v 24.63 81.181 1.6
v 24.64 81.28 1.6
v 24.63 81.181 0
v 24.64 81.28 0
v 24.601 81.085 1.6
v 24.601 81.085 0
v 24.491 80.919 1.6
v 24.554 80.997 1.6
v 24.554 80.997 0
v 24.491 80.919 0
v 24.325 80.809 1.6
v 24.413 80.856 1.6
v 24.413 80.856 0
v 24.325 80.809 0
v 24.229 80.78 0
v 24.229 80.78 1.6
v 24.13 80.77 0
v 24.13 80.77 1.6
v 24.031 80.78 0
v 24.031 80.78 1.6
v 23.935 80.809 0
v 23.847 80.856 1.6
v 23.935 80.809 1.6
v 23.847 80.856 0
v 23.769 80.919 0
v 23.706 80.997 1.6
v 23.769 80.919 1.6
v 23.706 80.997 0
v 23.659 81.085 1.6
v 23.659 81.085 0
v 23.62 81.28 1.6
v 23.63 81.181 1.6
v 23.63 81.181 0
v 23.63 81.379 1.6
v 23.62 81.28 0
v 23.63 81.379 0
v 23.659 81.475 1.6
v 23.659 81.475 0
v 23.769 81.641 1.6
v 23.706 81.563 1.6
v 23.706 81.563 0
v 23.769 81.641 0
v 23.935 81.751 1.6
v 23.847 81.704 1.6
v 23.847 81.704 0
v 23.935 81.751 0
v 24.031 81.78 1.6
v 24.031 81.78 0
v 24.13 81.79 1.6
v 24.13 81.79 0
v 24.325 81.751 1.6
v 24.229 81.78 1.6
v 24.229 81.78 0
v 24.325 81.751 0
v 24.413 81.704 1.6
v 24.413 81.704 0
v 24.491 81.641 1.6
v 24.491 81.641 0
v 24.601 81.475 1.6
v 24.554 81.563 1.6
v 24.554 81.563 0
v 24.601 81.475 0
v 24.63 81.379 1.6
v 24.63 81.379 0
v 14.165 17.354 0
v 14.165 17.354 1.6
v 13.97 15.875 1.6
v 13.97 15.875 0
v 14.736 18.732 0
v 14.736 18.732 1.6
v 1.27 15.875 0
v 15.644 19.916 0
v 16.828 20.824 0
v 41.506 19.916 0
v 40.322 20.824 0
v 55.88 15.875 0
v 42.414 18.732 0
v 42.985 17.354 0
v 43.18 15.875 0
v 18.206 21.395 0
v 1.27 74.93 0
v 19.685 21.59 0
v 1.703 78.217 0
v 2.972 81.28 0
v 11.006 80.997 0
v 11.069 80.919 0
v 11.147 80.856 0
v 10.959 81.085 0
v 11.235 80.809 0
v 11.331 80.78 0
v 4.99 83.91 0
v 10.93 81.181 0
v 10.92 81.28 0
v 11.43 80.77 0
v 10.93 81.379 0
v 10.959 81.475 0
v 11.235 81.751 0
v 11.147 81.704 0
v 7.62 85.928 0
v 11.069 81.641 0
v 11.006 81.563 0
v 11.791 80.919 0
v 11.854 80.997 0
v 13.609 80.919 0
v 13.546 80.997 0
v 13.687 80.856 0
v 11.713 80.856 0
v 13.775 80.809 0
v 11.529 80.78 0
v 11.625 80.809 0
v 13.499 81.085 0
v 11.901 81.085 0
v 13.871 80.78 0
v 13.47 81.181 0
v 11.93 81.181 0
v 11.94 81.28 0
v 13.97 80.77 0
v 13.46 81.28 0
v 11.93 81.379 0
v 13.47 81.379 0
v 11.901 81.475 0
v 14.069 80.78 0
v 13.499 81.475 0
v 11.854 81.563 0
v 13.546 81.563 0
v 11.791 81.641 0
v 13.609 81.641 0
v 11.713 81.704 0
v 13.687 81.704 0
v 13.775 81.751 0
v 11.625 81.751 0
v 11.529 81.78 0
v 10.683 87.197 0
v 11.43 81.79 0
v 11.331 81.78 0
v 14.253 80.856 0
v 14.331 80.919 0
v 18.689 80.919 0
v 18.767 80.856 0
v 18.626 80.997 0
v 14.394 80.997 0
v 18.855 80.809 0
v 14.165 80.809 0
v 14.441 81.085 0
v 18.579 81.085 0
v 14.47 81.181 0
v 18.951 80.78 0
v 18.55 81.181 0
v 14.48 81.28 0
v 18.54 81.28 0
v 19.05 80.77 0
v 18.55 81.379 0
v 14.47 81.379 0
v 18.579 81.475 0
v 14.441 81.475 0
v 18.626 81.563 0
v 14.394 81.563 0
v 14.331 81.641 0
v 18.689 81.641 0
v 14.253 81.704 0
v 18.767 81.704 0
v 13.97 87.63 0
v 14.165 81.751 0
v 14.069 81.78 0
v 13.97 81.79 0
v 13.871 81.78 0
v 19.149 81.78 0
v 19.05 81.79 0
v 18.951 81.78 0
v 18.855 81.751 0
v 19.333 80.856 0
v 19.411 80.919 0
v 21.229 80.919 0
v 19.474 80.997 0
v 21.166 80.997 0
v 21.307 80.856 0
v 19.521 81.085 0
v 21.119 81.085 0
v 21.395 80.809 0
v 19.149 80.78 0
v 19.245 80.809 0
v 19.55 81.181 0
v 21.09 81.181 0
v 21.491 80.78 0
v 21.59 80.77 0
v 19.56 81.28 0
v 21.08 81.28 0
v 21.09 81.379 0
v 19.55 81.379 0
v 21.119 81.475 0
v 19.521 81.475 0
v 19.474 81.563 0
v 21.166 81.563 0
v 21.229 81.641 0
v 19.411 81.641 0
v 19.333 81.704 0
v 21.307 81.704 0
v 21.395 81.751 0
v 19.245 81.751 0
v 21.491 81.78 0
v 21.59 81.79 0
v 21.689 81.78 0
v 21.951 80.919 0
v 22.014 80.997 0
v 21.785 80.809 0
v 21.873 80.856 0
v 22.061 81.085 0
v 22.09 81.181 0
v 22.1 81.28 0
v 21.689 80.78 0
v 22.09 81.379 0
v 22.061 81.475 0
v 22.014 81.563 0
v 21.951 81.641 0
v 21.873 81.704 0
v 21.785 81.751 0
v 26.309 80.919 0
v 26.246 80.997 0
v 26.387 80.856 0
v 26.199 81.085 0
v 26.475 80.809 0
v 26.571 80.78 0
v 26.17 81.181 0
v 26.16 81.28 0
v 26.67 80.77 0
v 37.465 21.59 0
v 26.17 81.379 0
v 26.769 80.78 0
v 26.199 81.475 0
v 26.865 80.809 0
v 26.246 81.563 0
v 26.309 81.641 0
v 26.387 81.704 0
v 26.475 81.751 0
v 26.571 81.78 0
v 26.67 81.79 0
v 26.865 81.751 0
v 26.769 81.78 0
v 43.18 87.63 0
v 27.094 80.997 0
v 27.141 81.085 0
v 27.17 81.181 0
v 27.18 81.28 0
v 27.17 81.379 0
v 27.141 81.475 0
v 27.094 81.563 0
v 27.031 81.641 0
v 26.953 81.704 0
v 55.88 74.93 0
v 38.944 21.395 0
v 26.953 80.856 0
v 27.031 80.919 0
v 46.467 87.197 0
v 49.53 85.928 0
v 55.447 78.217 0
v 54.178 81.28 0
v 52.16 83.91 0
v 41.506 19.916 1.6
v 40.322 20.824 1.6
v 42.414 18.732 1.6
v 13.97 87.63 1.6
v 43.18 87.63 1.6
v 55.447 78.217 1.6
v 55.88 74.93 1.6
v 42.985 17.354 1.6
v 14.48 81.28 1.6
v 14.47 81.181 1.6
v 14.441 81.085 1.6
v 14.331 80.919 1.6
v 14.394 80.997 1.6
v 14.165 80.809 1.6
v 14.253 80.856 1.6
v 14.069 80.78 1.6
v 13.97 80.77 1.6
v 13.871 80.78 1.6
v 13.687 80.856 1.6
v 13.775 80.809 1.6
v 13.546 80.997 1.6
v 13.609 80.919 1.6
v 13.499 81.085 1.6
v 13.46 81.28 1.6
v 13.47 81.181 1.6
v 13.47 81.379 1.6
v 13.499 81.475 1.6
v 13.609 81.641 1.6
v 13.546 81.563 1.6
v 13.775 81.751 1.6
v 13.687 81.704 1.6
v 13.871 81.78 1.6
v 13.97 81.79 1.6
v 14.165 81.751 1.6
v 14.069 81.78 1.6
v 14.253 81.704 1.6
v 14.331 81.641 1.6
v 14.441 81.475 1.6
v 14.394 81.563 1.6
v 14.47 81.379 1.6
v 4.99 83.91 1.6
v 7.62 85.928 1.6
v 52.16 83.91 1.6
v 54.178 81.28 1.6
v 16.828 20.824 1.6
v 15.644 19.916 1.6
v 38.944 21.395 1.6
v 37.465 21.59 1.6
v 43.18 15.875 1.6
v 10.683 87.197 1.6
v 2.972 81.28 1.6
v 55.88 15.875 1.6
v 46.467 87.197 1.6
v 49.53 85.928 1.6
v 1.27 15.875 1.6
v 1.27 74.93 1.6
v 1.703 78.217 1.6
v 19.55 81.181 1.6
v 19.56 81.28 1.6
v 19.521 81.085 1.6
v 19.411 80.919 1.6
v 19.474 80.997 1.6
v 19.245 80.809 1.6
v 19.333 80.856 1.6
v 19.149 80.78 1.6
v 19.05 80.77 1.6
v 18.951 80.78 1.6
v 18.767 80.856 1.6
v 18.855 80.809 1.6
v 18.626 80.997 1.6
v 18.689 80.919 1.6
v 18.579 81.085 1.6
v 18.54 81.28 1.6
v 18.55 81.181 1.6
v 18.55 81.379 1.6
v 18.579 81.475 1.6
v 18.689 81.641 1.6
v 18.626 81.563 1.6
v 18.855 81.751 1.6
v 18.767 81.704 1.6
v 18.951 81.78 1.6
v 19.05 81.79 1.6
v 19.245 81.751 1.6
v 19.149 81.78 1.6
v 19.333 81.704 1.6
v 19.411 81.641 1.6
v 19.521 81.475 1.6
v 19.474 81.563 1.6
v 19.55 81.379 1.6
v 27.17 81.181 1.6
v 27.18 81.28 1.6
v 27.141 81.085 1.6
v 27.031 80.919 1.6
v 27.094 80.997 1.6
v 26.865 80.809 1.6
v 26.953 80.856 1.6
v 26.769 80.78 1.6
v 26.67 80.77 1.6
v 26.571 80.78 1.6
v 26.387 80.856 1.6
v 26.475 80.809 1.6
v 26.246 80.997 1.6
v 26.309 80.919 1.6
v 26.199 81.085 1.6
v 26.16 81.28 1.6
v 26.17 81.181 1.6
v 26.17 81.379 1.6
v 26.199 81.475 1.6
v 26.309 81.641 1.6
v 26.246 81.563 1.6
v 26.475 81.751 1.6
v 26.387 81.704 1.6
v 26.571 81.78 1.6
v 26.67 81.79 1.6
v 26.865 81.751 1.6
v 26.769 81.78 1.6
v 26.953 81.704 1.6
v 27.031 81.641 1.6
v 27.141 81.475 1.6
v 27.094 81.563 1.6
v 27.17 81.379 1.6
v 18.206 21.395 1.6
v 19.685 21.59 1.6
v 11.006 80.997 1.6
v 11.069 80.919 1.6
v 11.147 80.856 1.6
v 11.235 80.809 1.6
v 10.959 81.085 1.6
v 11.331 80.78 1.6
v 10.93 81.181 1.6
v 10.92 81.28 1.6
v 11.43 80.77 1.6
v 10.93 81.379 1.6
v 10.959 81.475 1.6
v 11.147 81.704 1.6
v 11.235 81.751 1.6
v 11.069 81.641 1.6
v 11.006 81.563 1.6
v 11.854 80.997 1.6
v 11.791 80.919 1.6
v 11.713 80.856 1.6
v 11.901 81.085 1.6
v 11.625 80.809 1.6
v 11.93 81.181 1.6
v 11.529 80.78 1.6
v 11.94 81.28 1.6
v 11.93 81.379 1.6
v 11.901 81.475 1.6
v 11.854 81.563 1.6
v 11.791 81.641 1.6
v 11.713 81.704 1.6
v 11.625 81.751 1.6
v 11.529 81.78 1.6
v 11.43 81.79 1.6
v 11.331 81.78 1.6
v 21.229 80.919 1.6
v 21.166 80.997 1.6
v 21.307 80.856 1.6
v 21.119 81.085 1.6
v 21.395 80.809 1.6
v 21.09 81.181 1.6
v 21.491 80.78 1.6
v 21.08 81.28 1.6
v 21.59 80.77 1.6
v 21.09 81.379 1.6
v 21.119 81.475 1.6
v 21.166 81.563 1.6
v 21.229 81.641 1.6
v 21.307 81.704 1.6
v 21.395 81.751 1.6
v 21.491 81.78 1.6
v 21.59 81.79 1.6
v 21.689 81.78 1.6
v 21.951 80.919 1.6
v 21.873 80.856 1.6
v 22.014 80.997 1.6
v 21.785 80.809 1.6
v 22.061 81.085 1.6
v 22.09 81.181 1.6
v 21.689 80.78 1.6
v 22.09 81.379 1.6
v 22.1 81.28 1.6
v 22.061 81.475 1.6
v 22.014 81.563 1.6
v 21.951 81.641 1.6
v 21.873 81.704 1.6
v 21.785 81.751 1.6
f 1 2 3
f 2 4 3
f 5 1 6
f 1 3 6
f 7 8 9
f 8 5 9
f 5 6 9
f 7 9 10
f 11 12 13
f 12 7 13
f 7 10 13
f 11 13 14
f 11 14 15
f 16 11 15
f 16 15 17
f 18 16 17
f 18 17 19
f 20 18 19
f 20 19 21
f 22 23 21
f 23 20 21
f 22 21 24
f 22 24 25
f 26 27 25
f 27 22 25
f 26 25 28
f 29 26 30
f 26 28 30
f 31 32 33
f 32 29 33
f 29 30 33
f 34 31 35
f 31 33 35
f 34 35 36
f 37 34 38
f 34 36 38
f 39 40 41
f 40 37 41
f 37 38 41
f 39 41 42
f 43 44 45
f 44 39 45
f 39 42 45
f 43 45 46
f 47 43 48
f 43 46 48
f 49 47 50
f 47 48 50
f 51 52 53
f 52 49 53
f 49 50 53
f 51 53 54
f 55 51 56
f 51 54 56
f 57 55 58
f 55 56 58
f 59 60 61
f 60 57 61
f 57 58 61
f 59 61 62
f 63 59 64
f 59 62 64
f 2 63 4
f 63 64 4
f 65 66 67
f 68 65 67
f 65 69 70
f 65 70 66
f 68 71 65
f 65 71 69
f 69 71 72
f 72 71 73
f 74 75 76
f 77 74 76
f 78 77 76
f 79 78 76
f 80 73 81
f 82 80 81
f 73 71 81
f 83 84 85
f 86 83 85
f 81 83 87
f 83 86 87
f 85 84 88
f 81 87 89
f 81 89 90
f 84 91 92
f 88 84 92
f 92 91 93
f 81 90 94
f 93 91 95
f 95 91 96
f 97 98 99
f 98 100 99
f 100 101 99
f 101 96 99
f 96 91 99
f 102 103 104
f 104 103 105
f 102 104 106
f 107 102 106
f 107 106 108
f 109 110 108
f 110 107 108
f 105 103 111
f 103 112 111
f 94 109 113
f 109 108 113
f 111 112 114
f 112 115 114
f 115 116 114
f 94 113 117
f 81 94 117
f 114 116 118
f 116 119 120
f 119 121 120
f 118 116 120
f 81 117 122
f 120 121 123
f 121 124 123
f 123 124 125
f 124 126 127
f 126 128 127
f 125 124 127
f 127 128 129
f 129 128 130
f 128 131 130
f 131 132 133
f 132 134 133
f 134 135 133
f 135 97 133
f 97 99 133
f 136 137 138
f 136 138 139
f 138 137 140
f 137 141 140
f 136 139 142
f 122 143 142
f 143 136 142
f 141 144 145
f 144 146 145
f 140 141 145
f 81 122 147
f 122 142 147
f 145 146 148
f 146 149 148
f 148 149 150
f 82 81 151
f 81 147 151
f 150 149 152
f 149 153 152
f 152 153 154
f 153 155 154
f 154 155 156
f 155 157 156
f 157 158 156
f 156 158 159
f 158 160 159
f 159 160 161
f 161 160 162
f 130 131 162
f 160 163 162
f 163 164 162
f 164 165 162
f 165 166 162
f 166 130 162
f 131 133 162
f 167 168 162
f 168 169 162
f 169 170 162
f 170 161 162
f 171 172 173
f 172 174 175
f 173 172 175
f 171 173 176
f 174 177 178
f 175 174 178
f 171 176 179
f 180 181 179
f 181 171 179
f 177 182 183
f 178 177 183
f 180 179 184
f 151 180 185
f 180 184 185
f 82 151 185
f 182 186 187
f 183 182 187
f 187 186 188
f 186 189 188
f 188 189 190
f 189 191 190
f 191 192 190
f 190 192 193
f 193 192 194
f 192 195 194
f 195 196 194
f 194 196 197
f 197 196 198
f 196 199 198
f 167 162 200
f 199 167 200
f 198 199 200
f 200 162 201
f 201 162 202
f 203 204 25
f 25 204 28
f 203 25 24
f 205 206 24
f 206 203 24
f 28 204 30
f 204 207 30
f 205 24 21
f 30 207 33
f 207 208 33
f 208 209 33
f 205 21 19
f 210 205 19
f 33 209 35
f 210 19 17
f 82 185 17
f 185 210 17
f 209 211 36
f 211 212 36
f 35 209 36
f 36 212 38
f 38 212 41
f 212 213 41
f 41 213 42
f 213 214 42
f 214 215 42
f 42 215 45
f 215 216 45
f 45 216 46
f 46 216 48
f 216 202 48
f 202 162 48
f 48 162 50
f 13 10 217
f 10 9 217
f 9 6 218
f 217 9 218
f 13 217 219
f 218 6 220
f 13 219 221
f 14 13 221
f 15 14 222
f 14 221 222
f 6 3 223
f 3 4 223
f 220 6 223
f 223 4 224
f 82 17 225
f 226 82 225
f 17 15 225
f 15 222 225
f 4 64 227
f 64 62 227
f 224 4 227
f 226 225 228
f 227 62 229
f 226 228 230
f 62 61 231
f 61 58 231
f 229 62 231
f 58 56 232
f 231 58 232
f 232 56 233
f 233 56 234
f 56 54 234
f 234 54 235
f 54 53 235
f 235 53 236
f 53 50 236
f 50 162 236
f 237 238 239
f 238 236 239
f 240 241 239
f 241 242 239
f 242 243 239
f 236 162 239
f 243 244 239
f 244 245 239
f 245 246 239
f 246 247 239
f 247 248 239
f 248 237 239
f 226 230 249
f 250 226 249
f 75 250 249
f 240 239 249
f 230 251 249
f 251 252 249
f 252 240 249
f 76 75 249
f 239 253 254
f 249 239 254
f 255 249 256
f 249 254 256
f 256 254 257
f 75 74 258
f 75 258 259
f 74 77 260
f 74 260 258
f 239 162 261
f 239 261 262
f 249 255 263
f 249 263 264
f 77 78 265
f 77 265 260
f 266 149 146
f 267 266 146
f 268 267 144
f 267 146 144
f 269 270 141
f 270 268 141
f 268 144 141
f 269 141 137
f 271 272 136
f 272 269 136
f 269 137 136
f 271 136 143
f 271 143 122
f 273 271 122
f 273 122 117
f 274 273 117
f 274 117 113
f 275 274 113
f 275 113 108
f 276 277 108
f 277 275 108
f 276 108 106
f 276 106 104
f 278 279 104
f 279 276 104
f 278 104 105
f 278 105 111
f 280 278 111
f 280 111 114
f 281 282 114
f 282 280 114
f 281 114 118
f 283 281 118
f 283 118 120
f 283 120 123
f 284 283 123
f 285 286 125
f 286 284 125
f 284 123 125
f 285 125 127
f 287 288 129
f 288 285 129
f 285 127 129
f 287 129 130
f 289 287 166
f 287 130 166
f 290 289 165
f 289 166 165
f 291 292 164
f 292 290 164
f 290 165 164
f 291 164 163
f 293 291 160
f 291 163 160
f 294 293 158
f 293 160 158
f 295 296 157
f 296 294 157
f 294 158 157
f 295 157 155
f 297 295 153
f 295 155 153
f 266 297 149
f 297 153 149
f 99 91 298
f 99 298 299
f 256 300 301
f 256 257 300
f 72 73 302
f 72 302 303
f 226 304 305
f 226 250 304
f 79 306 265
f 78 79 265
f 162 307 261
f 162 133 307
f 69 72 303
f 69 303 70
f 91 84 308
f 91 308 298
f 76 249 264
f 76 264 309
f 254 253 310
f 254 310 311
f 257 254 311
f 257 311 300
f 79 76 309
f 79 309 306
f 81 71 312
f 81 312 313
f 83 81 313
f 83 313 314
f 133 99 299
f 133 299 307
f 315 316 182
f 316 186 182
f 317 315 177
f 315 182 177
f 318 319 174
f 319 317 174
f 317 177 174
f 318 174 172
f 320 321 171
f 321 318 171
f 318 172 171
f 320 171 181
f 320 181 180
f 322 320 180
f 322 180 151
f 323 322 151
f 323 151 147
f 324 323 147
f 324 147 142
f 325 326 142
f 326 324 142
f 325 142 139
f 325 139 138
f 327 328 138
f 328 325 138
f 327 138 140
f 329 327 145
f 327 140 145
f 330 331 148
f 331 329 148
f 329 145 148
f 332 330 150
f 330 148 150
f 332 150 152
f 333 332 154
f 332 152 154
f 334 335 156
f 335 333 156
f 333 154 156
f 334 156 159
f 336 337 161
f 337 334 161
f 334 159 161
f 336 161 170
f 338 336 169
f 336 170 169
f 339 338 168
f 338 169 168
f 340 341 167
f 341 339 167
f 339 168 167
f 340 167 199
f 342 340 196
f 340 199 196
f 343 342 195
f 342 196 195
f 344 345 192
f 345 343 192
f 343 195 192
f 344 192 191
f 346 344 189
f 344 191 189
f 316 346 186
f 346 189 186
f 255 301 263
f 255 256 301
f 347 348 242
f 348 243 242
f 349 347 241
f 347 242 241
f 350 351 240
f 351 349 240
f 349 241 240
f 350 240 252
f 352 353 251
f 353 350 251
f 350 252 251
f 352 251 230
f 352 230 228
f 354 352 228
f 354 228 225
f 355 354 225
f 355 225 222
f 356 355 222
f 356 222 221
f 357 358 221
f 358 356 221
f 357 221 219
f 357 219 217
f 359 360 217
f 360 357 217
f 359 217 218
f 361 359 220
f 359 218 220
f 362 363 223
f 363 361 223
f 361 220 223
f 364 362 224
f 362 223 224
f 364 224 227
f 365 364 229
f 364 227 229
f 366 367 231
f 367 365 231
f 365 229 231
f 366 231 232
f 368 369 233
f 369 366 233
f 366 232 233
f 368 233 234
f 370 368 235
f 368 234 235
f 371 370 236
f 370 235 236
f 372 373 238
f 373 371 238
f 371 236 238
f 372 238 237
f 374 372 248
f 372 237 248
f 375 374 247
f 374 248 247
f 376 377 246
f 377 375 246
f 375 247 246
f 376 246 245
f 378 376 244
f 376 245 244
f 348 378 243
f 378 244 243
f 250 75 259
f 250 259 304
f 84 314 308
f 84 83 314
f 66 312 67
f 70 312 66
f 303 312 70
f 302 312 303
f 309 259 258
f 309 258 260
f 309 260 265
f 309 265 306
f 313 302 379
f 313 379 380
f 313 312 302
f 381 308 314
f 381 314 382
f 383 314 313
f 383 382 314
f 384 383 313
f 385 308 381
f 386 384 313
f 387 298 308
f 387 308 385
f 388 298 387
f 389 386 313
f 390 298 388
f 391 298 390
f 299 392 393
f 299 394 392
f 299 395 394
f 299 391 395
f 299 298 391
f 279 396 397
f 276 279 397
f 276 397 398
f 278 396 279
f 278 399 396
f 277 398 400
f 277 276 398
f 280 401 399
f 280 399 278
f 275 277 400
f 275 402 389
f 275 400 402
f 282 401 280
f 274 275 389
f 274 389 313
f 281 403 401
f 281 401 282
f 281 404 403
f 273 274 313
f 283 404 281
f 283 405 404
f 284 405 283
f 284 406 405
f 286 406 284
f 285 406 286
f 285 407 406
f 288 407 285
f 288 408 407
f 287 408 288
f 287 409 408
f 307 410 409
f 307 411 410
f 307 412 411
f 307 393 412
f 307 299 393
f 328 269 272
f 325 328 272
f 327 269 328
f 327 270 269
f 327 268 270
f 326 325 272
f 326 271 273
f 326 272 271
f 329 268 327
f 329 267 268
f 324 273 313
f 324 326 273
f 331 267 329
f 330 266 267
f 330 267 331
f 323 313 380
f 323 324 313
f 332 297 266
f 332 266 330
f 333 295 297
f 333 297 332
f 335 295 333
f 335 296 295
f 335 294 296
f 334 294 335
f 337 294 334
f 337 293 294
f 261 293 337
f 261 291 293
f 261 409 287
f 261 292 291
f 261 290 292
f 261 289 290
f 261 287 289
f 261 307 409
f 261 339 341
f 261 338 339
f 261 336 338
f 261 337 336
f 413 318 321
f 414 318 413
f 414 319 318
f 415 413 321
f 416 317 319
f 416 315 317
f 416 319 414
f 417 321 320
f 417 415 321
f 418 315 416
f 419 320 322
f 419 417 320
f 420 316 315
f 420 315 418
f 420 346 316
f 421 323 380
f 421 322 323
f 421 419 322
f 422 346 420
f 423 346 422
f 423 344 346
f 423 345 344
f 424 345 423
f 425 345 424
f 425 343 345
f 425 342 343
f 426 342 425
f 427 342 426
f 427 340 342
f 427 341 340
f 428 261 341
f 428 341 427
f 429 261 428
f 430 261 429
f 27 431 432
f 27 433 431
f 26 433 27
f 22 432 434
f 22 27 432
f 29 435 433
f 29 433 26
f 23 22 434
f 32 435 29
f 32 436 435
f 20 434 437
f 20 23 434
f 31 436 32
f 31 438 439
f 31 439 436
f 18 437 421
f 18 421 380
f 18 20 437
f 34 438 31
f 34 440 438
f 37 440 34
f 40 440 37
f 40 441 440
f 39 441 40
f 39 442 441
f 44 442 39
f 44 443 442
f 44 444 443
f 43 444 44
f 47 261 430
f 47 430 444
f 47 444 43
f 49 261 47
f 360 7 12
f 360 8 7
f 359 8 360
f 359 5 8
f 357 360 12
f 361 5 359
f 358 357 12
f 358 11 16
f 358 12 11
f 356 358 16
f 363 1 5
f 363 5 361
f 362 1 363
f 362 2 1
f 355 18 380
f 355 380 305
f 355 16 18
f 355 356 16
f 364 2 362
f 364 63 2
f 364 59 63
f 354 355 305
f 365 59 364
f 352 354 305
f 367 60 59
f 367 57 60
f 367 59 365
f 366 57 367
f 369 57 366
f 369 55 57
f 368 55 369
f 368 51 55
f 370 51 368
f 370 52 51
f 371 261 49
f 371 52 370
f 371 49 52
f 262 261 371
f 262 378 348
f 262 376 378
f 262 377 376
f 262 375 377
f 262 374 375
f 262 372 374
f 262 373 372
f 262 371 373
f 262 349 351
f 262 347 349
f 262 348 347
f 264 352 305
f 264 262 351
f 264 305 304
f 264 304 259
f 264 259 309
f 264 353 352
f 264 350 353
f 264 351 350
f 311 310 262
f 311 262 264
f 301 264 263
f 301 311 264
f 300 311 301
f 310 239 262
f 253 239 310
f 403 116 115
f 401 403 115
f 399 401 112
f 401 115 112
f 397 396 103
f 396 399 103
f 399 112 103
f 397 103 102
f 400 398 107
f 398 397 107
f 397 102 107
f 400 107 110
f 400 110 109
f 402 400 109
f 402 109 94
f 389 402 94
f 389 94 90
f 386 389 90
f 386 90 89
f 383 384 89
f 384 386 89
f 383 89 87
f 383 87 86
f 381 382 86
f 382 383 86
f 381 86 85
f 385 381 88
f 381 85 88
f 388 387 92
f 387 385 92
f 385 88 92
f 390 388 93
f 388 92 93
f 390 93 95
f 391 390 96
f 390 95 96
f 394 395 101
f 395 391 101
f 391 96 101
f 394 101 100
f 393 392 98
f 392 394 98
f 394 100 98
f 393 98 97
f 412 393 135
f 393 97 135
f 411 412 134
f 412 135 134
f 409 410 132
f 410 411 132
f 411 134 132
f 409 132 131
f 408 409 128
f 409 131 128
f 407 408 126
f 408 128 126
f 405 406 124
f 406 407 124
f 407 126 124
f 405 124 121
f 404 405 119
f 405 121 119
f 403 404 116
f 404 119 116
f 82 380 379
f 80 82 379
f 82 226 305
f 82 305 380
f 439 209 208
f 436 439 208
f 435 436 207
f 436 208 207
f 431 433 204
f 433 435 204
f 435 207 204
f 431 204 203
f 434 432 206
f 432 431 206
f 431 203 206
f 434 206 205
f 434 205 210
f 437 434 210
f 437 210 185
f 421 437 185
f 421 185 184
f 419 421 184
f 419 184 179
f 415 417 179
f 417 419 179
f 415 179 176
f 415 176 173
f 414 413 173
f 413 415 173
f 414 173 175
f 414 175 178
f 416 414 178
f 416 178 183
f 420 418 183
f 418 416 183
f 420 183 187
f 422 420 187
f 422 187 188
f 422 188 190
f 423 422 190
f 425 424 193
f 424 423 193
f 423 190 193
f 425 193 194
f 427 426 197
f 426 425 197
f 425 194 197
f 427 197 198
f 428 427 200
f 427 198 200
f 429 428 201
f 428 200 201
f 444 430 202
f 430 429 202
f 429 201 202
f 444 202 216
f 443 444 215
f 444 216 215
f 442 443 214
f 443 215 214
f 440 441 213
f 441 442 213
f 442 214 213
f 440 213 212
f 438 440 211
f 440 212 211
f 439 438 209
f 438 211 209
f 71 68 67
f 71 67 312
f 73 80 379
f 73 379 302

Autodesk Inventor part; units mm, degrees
ref_plane "YZ Plane" through (0, 0, 0) normal (1, 0, 0) x (0, 1, 0)
ref_plane "XZ Plane" through (0, 0, 0) normal (0, 1, 0) x (-1, 0, 0)
ref_plane "XY Plane" through (0, 0, 0) normal (0, 0, 1) x (1, 0, 0)
sketch "Sketch1" plane through (0, 0, 0) normal (0, 0, 1) x (1, 0, 0)
  line L0 (55.88, 74.93) -> (55.88, 15.875)
  line L1 (55.88, 15.875) -> (43.18, 15.875)
  line L2 (43.18, 15.875) -> (42.9853, 17.3542)
  line L3 (42.9853, 17.3542) -> (42.4143, 18.7325)
  line L4 (42.4143, 18.7325) -> (41.5061, 19.9161)
  line L5 (41.5061, 19.9161) -> (40.3225, 20.8243)
  line L6 (40.3225, 20.8243) -> (38.9442, 21.3953)
  line L7 (38.9442, 21.3953) -> (37.465, 21.59)
  line L8 (37.465, 21.59) -> (19.685, 21.59)
  line L9 (19.685, 21.59) -> (18.2058, 21.3953)
  line L10 (18.2058, 21.3953) -> (16.8275, 20.8243)
  line L11 (16.8275, 20.8243) -> (15.6439, 19.9161)
  line L12 (15.6439, 19.9161) -> (14.7357, 18.7325)
  line L13 (14.7357, 18.7325) -> (14.1647, 17.3542)
  line L14 (14.1647, 17.3542) -> (13.97, 15.875)
  line L15 (13.97, 15.875) -> (1.27, 15.875)
  line L16 (1.27, 15.875) -> (1.27, 74.93)
  line L17 (1.27, 74.93) -> (1.7027, 78.217)
  line L18 (1.7027, 78.217) -> (2.9715, 81.28)
  line L19 (2.9715, 81.28) -> (4.9897, 83.9103)
  line L20 (4.9897, 83.9103) -> (7.62, 85.9285)
  line L21 (7.62, 85.9285) -> (10.683, 87.1973)
  line L22 (10.683, 87.1973) -> (13.97, 87.63)
  line L23 (13.97, 87.63) -> (43.18, 87.63)
  line L24 (43.18, 87.63) -> (46.467, 87.1973)
  line L25 (46.467, 87.1973) -> (49.53, 85.9285)
  line L26 (49.53, 85.9285) -> (52.1603, 83.9103)
  line L27 (52.1603, 83.9103) -> (54.1785, 81.28)
  line L28 (54.1785, 81.28) -> (55.4473, 78.217)
  line L29 (55.4473, 78.217) -> (55.88, 74.93)
  circle A0 centre (11.43, 81.28) radius 0.51
  circle A1 centre (13.97, 81.28) radius 0.51
  circle A2 centre (19.05, 81.28) radius 0.51
  circle A3 centre (21.59, 81.28) radius 0.51
  circle A4 centre (24.13, 81.28) radius 0.51
  circle A5 centre (26.67, 81.28) radius 0.51
extrude "untitled.brd_Outline" add sketch "Sketch1" along normal blind 1.6
properties part number "untitled.brd_Outline"
